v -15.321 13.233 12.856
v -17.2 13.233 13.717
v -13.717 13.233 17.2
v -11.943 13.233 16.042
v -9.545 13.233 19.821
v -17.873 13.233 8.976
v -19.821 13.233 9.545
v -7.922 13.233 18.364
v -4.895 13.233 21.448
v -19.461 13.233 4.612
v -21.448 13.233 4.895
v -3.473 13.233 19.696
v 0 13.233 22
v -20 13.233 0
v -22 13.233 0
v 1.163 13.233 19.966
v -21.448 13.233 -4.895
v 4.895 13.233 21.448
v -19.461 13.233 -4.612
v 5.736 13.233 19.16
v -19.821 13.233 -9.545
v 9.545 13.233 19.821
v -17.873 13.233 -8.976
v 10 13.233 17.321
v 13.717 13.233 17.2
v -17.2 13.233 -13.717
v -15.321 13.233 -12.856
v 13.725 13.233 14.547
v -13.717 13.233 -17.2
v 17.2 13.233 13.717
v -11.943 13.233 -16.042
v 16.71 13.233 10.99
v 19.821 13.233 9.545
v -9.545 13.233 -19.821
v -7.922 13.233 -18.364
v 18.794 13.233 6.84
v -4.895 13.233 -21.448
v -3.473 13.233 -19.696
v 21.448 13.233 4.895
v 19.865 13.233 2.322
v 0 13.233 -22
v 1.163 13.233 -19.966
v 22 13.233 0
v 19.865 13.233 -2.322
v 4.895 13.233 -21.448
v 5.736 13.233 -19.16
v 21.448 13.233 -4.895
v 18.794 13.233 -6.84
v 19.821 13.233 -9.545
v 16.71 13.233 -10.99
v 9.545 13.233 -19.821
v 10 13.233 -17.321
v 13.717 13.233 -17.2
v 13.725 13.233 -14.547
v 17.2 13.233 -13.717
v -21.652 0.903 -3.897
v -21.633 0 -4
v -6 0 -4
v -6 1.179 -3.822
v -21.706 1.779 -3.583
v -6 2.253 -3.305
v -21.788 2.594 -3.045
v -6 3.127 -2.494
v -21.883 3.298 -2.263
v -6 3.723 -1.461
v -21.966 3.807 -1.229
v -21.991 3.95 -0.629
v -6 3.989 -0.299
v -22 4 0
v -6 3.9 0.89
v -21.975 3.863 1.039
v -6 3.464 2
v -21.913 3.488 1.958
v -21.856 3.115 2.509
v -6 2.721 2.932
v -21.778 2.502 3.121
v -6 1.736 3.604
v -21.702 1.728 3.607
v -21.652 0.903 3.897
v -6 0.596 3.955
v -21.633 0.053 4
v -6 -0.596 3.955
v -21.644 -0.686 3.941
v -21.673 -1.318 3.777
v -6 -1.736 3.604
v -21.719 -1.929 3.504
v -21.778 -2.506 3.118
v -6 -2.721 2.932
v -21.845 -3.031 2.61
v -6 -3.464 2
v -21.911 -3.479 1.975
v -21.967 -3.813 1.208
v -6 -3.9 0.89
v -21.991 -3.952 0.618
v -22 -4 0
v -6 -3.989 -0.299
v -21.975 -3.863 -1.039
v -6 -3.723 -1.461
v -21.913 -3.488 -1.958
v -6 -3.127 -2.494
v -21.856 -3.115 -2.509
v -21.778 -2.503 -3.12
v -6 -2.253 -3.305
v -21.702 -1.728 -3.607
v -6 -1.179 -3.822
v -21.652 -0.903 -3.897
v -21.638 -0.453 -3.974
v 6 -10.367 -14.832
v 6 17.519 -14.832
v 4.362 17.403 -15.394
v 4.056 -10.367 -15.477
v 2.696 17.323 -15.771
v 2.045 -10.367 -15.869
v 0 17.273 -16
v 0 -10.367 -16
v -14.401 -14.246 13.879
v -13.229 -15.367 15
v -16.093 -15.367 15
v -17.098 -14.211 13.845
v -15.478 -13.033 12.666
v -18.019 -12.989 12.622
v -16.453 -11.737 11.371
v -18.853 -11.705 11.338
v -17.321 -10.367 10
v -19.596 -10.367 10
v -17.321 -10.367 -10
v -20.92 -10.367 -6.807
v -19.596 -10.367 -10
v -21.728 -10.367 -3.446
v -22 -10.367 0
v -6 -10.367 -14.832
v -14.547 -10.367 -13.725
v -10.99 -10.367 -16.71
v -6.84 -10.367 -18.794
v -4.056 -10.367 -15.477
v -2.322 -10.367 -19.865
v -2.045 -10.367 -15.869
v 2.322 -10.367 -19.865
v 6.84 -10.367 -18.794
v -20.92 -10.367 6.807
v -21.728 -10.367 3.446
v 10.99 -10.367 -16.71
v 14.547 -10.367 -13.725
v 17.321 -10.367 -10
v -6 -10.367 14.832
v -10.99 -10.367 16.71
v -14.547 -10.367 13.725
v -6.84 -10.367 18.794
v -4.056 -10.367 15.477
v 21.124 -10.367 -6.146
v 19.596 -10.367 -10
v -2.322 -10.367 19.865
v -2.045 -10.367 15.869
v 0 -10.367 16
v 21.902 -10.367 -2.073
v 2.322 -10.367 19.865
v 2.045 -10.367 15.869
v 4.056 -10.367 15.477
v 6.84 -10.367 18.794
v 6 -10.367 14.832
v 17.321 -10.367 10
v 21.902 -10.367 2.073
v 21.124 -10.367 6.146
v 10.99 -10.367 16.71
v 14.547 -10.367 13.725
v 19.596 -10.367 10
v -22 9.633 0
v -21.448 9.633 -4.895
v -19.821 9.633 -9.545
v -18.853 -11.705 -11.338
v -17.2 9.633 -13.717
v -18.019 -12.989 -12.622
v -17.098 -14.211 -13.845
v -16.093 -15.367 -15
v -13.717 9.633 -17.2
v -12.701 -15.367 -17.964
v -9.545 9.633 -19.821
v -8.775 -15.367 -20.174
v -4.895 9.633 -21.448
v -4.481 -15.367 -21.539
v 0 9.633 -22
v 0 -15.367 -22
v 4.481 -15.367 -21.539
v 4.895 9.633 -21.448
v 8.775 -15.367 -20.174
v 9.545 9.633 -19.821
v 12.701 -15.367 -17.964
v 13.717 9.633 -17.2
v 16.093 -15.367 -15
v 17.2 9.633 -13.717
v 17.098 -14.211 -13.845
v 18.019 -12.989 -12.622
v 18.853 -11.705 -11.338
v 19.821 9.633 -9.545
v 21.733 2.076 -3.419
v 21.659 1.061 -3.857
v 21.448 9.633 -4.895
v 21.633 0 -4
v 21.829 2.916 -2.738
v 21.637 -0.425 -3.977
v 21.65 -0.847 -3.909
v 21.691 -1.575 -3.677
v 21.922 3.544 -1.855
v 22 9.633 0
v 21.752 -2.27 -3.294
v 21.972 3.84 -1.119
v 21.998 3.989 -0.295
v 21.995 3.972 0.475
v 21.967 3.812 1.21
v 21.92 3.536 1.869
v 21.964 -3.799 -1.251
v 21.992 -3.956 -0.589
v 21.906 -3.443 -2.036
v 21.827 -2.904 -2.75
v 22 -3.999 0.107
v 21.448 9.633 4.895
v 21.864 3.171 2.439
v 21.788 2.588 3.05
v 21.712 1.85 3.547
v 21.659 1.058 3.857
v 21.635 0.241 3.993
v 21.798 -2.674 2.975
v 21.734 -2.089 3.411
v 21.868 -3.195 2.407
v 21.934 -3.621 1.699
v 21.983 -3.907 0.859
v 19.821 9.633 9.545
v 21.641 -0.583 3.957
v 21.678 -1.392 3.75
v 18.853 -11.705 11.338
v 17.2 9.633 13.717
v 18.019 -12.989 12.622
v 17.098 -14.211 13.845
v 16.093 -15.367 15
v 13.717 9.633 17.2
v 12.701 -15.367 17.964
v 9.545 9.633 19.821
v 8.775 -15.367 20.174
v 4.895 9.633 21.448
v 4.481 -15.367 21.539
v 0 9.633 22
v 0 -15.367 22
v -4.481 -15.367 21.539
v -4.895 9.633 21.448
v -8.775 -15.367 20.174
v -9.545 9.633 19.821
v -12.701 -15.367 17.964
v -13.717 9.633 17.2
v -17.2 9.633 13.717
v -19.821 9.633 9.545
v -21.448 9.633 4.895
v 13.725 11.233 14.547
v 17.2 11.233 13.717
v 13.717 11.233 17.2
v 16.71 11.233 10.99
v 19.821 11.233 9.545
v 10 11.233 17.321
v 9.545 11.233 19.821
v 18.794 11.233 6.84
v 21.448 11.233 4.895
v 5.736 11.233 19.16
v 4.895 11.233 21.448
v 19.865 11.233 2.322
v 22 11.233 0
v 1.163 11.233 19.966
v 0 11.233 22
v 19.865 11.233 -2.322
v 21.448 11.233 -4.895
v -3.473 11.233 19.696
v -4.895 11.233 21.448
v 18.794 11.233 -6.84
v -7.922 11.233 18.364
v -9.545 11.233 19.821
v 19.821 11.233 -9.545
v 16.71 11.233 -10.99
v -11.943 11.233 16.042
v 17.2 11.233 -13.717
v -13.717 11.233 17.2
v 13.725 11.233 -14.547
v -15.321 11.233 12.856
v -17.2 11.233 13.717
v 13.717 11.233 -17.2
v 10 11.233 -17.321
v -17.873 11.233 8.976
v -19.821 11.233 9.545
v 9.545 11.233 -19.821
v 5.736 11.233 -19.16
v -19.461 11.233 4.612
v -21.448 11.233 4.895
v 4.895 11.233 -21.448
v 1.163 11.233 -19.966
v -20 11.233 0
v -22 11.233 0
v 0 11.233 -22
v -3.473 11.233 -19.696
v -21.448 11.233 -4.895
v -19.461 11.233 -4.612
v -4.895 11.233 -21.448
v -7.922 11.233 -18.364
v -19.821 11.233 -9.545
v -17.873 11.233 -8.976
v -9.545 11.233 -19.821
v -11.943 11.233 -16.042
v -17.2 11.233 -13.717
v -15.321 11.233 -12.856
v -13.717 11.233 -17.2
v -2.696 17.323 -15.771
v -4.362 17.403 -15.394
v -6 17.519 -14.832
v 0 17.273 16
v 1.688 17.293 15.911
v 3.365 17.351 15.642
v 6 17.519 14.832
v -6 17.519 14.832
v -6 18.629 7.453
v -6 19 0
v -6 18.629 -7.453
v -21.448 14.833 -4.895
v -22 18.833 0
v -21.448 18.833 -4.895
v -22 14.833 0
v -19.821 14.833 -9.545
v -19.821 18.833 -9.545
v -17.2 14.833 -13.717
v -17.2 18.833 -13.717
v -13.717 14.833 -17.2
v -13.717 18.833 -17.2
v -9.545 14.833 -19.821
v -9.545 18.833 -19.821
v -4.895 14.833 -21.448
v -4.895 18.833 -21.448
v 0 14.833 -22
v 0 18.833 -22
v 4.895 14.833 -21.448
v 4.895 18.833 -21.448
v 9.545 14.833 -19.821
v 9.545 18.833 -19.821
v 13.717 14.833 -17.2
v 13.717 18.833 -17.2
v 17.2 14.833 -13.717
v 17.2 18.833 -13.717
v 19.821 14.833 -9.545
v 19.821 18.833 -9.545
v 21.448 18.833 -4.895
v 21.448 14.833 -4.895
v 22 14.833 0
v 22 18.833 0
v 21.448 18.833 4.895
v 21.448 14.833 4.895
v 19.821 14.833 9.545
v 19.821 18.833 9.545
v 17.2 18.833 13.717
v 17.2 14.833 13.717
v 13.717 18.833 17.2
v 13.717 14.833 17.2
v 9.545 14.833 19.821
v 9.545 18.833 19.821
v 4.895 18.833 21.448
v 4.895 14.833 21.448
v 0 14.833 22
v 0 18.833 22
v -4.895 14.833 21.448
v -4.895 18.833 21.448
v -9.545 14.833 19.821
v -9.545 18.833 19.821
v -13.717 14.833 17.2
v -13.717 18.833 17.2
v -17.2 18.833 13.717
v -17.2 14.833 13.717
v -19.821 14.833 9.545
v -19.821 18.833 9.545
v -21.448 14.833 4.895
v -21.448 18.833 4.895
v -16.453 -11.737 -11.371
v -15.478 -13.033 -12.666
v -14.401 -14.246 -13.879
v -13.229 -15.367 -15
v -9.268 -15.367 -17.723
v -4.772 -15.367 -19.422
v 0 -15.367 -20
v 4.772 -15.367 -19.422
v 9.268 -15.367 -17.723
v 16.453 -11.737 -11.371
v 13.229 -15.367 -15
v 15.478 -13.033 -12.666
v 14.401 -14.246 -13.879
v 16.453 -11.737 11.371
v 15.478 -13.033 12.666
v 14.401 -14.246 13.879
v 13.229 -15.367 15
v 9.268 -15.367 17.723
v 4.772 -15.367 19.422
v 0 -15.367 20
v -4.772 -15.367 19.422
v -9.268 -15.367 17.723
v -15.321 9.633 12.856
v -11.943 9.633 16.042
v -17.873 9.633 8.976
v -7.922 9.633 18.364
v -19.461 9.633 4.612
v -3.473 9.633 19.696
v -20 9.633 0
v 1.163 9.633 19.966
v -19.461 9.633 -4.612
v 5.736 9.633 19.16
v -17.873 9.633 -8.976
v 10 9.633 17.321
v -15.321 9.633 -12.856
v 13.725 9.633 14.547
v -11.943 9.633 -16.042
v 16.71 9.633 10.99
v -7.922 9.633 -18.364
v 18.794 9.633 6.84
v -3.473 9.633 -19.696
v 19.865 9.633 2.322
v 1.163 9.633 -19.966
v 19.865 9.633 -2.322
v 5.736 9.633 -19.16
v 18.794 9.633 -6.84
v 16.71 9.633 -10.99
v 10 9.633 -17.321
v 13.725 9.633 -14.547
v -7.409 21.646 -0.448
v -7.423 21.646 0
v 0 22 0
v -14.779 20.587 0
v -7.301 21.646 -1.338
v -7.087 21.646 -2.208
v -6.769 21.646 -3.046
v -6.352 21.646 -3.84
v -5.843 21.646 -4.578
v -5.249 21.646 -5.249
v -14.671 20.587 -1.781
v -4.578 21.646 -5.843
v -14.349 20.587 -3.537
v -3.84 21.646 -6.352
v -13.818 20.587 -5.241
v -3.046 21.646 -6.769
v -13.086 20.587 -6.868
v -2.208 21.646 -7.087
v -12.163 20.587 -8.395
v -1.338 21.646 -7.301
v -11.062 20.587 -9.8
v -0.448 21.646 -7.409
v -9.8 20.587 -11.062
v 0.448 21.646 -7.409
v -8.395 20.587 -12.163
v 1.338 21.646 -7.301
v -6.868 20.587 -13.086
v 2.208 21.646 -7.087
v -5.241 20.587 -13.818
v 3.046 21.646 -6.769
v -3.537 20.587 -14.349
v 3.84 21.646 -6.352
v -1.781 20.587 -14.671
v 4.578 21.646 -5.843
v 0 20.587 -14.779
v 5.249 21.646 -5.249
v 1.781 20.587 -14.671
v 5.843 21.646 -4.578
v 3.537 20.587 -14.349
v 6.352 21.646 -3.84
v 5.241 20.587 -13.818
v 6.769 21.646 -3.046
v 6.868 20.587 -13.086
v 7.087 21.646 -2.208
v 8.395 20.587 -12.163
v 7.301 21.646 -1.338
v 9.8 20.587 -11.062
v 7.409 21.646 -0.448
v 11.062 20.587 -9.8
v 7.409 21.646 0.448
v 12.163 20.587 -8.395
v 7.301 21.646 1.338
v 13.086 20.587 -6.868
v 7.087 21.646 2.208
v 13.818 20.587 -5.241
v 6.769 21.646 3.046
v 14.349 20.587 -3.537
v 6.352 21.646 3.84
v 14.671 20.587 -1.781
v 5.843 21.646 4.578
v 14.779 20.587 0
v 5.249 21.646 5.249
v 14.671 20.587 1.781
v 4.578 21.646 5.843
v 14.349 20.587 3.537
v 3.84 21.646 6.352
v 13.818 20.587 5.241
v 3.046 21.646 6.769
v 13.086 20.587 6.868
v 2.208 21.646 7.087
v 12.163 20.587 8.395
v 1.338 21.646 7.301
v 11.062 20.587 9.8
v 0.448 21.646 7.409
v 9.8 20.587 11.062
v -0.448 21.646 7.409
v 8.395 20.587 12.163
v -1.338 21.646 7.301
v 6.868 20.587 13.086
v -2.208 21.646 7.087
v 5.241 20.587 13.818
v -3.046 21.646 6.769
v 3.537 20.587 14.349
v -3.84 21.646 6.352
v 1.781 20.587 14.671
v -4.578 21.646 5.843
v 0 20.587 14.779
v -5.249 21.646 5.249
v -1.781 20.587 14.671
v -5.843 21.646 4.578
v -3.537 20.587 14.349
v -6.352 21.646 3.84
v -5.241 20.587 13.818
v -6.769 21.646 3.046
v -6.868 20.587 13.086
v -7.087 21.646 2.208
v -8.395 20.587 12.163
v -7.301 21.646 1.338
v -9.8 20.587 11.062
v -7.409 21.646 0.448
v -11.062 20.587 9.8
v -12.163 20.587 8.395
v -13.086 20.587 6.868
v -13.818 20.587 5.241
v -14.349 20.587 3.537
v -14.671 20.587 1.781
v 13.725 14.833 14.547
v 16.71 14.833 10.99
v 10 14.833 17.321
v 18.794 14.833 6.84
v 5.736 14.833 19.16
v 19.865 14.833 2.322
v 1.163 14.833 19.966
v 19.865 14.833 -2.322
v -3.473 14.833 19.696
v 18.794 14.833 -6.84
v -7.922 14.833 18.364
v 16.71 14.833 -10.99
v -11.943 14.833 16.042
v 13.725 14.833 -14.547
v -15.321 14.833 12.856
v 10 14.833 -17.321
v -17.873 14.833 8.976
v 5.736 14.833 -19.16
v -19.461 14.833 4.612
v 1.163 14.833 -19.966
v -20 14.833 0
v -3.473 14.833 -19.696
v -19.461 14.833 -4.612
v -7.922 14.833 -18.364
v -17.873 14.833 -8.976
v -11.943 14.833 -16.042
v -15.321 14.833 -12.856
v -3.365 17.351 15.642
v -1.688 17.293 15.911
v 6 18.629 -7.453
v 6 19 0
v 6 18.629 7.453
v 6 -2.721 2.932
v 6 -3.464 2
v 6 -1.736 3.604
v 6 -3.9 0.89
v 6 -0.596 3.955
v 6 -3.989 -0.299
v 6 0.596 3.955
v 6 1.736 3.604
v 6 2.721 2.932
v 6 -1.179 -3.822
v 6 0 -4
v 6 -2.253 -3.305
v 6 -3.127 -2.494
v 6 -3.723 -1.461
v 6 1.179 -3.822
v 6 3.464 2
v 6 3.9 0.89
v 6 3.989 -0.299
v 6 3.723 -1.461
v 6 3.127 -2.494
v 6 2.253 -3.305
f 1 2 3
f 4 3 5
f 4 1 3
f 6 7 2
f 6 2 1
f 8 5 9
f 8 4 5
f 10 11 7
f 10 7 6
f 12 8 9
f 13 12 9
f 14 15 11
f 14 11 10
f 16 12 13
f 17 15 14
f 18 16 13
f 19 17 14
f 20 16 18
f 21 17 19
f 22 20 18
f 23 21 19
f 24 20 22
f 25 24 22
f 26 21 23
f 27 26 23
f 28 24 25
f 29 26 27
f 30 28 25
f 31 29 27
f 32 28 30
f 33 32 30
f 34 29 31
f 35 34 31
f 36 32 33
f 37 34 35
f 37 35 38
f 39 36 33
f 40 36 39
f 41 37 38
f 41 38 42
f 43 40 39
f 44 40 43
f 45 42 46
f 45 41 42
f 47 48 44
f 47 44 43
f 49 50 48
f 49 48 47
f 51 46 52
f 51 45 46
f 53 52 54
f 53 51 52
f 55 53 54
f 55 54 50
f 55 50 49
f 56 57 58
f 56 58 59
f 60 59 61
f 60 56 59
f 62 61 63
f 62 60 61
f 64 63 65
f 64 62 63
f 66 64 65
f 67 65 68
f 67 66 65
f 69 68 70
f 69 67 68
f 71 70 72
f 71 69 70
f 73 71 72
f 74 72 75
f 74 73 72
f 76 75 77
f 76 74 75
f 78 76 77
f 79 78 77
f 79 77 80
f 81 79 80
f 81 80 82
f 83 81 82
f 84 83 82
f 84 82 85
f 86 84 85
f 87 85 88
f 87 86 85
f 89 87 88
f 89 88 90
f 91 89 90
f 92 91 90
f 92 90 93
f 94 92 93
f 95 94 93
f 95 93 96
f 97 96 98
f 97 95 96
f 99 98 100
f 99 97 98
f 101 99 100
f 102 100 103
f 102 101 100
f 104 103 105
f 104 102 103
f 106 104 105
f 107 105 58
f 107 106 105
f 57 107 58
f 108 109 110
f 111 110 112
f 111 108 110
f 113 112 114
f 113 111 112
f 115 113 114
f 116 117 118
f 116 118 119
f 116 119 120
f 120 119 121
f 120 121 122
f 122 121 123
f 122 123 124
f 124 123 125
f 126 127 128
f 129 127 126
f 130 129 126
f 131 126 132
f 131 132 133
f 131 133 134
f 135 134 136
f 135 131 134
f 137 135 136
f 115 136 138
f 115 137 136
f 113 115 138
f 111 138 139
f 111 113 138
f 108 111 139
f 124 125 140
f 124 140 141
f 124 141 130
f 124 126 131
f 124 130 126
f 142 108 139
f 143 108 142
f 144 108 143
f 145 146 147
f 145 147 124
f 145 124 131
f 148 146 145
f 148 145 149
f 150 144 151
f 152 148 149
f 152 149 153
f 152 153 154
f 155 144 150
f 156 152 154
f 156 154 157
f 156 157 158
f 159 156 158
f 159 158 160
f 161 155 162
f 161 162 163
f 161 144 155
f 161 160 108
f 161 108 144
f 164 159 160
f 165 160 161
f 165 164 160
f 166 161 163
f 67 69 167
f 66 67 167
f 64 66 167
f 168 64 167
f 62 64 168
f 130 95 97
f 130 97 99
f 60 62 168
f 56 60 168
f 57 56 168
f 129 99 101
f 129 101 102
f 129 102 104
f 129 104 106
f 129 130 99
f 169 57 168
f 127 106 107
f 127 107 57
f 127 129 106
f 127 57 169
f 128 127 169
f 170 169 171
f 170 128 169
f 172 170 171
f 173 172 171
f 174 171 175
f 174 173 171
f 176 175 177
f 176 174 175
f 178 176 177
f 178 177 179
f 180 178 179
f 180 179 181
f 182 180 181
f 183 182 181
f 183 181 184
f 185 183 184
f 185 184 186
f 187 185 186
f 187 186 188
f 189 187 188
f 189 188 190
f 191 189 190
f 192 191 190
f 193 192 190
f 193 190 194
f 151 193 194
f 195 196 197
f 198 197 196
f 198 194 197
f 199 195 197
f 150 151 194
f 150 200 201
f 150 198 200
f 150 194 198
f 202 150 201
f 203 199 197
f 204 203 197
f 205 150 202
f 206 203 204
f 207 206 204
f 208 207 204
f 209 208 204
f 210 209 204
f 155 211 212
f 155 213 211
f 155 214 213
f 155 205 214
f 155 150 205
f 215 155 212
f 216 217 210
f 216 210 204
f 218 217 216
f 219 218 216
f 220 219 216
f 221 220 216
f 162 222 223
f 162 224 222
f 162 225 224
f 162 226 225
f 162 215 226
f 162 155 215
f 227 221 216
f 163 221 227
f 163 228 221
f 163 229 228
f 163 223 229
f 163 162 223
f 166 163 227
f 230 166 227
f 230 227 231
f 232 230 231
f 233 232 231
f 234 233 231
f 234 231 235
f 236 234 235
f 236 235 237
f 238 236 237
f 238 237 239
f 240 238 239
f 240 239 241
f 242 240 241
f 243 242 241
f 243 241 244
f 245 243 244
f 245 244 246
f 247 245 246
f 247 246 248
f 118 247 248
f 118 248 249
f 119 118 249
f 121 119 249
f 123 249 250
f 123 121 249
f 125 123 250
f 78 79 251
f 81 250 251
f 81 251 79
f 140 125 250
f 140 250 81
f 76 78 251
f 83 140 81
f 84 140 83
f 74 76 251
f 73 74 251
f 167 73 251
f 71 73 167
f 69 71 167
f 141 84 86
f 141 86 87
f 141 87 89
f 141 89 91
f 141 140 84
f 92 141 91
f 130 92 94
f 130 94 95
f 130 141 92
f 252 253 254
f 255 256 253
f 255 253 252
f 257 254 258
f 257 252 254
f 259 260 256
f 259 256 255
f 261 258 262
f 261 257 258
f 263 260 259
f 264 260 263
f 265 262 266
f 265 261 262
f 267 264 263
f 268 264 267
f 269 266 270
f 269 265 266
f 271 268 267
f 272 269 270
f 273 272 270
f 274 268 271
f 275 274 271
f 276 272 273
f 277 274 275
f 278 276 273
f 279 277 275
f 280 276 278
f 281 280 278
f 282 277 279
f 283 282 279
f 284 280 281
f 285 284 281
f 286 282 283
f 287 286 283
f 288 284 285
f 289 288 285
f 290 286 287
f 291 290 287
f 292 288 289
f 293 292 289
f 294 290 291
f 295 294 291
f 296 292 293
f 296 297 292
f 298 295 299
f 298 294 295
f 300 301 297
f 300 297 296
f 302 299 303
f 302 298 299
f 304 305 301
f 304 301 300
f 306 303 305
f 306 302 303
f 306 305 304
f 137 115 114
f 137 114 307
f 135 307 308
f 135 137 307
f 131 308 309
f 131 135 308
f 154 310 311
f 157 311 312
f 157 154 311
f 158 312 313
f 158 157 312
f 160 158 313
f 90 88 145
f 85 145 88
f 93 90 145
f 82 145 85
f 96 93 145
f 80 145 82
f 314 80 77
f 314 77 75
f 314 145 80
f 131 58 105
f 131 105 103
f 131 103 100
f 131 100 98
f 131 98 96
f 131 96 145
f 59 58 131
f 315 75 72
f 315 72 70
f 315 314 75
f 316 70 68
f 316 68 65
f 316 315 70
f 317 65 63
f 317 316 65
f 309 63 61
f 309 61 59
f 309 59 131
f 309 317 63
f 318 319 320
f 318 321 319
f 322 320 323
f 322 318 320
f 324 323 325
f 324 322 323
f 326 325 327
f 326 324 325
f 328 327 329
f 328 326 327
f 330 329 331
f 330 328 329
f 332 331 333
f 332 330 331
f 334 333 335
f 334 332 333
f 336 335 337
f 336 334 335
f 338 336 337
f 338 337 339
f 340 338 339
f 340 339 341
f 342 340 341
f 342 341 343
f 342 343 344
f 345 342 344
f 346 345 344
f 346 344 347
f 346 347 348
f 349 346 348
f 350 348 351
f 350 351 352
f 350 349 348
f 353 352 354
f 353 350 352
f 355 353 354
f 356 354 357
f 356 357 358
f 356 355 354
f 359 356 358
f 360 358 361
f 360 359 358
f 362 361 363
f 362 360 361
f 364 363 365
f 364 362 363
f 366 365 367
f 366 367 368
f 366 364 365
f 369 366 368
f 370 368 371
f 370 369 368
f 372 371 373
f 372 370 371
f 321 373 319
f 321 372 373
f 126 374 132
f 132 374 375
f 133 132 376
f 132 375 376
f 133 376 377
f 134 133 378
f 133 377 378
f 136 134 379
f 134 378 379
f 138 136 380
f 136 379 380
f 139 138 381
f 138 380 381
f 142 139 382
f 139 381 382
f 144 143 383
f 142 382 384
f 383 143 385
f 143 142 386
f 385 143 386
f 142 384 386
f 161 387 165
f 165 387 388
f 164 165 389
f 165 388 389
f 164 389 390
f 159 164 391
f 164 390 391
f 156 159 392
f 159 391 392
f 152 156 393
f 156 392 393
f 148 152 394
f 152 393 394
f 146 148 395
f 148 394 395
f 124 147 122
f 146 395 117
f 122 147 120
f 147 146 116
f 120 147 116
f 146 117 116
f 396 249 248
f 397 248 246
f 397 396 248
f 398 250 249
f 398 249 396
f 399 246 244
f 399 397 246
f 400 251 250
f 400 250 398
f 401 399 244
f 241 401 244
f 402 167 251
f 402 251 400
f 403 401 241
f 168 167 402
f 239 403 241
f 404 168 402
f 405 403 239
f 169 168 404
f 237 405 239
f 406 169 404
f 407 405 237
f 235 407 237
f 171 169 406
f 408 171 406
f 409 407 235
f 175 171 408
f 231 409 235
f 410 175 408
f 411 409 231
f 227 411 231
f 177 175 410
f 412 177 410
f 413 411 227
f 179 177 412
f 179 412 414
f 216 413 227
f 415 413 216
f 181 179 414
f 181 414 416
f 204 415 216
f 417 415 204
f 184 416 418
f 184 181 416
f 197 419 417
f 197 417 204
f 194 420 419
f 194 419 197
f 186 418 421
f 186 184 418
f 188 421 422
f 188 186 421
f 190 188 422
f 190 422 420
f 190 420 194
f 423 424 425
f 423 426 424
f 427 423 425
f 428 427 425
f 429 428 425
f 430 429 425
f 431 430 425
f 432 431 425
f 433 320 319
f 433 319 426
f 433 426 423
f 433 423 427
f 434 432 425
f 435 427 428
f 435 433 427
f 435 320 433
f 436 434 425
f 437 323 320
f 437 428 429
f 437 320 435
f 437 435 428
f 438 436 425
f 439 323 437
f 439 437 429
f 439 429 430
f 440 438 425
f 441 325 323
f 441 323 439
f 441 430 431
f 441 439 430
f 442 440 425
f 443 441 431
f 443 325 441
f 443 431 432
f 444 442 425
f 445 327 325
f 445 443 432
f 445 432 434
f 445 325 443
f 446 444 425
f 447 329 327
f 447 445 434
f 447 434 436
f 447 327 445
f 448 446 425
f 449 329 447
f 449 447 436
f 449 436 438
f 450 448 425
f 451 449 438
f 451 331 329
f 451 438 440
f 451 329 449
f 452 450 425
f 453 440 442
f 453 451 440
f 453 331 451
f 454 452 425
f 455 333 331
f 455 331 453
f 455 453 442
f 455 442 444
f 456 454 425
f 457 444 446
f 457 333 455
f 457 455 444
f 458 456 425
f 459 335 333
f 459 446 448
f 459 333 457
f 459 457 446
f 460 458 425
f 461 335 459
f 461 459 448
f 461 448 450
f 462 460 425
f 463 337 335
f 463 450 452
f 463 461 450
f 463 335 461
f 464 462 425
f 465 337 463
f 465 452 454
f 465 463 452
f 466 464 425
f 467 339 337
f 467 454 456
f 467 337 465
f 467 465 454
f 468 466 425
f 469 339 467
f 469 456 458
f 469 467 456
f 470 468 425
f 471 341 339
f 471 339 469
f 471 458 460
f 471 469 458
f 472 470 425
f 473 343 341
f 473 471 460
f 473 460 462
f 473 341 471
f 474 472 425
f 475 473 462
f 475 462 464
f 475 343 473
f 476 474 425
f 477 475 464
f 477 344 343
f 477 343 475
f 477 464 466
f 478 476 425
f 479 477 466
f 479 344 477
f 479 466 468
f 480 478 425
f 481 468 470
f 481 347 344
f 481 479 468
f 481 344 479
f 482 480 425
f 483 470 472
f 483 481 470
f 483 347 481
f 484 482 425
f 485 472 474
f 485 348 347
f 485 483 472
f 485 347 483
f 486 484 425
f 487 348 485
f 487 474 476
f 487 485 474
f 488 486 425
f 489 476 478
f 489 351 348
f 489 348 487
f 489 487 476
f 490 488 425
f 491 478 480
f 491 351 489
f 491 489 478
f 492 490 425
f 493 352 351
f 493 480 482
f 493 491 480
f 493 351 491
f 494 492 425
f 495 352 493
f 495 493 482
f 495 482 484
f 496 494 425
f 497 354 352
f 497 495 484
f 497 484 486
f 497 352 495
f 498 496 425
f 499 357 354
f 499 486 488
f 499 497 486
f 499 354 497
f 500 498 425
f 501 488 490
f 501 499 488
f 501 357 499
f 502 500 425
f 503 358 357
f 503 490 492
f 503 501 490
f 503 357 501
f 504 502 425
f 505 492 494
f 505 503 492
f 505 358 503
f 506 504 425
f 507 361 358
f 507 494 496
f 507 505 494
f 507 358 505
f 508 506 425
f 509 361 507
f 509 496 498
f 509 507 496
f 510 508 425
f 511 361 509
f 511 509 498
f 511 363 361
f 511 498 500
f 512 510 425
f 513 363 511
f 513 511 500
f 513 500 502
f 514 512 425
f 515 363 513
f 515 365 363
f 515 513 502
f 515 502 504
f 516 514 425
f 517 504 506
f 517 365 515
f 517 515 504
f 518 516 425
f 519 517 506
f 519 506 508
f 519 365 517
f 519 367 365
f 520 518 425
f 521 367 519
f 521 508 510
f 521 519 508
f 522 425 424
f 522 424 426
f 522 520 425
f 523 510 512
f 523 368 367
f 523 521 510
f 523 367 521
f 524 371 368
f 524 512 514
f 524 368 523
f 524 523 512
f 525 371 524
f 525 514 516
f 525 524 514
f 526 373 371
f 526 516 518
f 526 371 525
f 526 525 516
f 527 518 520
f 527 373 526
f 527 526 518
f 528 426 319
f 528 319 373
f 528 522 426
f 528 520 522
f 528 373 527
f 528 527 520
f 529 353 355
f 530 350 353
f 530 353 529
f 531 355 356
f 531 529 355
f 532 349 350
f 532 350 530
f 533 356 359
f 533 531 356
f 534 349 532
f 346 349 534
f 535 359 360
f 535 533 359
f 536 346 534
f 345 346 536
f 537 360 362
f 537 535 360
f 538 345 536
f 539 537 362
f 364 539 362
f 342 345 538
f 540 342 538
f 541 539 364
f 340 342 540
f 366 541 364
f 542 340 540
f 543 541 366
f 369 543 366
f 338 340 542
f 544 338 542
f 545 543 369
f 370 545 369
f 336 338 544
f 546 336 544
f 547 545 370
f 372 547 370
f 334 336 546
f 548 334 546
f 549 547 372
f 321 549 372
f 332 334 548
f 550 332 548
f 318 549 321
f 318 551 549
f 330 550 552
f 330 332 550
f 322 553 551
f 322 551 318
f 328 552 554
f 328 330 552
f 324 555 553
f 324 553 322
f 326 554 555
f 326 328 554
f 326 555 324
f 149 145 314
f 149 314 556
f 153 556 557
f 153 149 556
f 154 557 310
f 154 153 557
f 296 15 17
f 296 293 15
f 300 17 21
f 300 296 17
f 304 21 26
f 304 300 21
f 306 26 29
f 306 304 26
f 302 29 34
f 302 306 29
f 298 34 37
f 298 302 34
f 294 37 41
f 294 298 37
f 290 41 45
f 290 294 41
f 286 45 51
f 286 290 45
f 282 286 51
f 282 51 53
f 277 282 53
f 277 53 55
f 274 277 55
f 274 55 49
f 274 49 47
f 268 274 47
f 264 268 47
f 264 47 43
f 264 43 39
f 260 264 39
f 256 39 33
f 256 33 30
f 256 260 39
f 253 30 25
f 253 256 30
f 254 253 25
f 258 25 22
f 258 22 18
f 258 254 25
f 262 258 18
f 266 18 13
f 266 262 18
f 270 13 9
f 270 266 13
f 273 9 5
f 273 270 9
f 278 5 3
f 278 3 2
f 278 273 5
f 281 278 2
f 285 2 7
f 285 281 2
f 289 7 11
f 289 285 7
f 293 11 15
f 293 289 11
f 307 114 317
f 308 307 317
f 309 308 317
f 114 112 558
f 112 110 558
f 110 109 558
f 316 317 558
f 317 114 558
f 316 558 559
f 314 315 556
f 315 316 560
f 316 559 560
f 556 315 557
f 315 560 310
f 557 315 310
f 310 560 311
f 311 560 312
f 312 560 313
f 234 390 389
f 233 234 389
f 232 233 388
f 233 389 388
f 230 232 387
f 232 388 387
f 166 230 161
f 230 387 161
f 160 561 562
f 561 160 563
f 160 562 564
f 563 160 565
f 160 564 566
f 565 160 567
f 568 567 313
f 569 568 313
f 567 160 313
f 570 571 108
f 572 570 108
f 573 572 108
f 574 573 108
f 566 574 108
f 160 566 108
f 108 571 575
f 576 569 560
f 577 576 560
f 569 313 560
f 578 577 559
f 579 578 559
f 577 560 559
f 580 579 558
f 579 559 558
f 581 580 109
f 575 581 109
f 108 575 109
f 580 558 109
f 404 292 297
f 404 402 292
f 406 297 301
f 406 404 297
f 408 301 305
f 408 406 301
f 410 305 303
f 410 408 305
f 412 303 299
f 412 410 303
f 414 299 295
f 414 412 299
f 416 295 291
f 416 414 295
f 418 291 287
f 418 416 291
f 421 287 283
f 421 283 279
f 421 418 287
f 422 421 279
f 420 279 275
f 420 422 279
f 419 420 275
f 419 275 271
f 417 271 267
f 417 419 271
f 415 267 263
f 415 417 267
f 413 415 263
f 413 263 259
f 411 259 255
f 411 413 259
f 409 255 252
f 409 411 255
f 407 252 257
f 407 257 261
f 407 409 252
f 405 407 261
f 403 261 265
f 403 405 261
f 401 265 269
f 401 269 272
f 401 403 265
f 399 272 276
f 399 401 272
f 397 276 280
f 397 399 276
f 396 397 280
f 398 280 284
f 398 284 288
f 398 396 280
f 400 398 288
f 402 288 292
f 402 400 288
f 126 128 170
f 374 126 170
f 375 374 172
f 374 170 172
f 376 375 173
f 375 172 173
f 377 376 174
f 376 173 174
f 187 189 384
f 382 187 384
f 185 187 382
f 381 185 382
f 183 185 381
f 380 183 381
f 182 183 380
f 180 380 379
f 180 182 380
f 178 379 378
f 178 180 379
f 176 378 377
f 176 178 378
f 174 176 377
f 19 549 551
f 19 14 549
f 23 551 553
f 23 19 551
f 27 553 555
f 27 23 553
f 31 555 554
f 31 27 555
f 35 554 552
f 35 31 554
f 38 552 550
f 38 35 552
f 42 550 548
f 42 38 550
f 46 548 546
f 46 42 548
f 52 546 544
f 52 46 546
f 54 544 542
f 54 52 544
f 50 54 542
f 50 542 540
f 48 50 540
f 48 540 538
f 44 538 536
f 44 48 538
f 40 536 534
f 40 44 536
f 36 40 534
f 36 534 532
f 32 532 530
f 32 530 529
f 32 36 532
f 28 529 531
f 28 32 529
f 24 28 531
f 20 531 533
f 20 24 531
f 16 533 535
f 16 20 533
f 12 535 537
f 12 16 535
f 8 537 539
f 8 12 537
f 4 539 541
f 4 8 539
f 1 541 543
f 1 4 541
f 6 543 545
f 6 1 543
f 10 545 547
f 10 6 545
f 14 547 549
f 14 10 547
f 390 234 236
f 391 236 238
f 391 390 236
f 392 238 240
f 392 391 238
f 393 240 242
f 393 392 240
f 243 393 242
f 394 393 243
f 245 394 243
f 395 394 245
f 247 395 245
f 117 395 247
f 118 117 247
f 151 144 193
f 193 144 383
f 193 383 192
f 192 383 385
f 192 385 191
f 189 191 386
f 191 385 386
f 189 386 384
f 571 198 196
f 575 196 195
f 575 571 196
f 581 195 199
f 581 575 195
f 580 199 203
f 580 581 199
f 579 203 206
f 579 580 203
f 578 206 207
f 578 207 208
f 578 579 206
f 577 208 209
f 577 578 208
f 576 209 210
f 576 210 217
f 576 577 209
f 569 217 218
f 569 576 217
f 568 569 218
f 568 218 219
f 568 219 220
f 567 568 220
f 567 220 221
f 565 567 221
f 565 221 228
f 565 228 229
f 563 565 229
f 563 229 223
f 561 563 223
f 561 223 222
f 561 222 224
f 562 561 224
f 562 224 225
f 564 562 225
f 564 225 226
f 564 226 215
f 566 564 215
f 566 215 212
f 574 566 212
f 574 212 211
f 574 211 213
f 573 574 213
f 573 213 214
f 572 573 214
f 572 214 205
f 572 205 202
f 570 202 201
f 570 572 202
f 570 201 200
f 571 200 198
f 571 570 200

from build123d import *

# Parameters (mm, degrees)
CUT_EXTRUDE_2_DEPTH      = 39.105117767
CUT_EXTRUDE_2_DEPTH_BACK = 39.105117767
SKETCH_4_R               = 4
SKETCH_6_R               = 20
CUT_EXTRUDE_3_DEPTH      = 5
CUT_EXTRUDE_4_DEPTH      = 6
EXTRUDE_1_REACH          = 46.896
EXTRUDE_1_END_RADIUS     = 75


with BuildPart() as part:
    # 草图1 → 旋转3 (revolve)
    with BuildSketch(Plane.XY):
        with BuildLine():
            Line((-22, 9.633147735), (-22, -15.366852265))
            Line((-22, -15.366852265), (0, -15.366852265))
            Line((0, -15.366852265), (0, 22))
            ThreePointArc((0, 22), (-11.113381048, 21.204227615), (-22, 18.833147735))
            Line((-22, 18.833147735), (-22, 14.833147735))
            Line((-22, 14.833147735), (-20, 14.833147735))
            Line((-20, 14.833147735), (-20, 13.233147735))
            Line((-20, 13.233147735), (-22, 13.233147735))
            Line((-22, 13.233147735), (-22, 11.233147735))
            Line((-22, 11.233147735), (-20, 11.233147735))
            Line((-20, 11.233147735), (-20, 9.633147735))
            Line((-20, 9.633147735), (-22, 9.633147735))
        make_face()
    revolve(axis=Axis((0, 22, 0), (0, -1, 0)))

    # 草图4 → 切除-拉伸2 (cut, two sides: drawn at the far end of the back side and taken through both)
    with BuildSketch(Plane(origin=(0, 0, 0), x_dir=(0, 0, -1), z_dir=(1, 0, 0)).offset(-CUT_EXTRUDE_2_DEPTH_BACK)):
        Circle(SKETCH_4_R)
        Polygon((-15, -15.366852265), (-10, -10.366852265), (10, -10.366852265), (15, -15.366852265), align=None)
    extrude(amount=CUT_EXTRUDE_2_DEPTH + CUT_EXTRUDE_2_DEPTH_BACK, mode=Mode.SUBTRACT)

    # 草图6 → 切除-拉伸3 (cut)
    with BuildSketch(Plane.XZ.offset(15.366852265)):
        with Locations(Location((0, 0, 0), (0, 0, 180))):
            Circle(SKETCH_6_R)
    extrude(amount=-CUT_EXTRUDE_3_DEPTH, mode=Mode.SUBTRACT)

    # 草图8 → 切除-拉伸4 (cut, symmetric)
    with BuildSketch(Plane(origin=(0, 0, 0), x_dir=(0, 0, -1), z_dir=(1, 0, 0))):
        with BuildLine():
            Line((-16, 17.273460407), (-16, -10.366852265))
            Line((-16, -10.366852265), (16, -10.366852265))
            Line((16, -10.366852265), (16, 17.273460407))
            ThreePointArc((16, 17.273460407), (0, 19), (-16, 17.273460407))
        make_face()
    extrude(amount=CUT_EXTRUDE_4_DEPTH, both=True, mode=Mode.SUBTRACT)

    # 凸台-拉伸1: up to this cylinder (the profile starts inside it)
    extrude_1_end = Plane(origin=(0, -56, 0), z_dir=(1, 0, 0)) * Cylinder(EXTRUDE_1_END_RADIUS, 253.81433, mode=Mode.PRIVATE)
    # 草图9 → 凸台-拉伸1 (add, up to the surface)
    with BuildSketch(Plane.XZ.offset(10.366852265), mode=Mode.PRIVATE) as extrude_1_sk1:
        with BuildLine():
            Line((6, -16), (6, -14.832396974))
            ThreePointArc((6, -14.832396974), (3.056276215, -15.705386837), (3.1e-08, -16))
            Line((3.1e-08, -16), (6, -16))
        make_face()
    extrude_1_tool1 = extrude(extrude_1_sk1.sketch, amount=-EXTRUDE_1_REACH, mode=Mode.PRIVATE) & extrude_1_end
    add(extrude_1_tool1.solids().sort_by_distance((4.511165, -10.366852, -15.652025))[0])
    # 草图9 → 凸台-拉伸1 (add, up to the surface)
    with BuildSketch(Plane.XZ.offset(10.366852265), mode=Mode.PRIVATE) as extrude_1_sk2:
        with BuildLine():
            Line((-6, -16), (3.1e-08, -16))
            ThreePointArc((3.1e-08, -16), (-3.056276184, -15.705386843), (-6, -14.832396974))
            Line((-6, -14.832396974), (-6, -16))
        make_face()
    extrude_1_tool2 = extrude(extrude_1_sk2.sketch, amount=-EXTRUDE_1_REACH, mode=Mode.PRIVATE) & extrude_1_end
    add(extrude_1_tool2.solids().sort_by_distance((-4.511165, -10.366852, -15.652025))[0])
    # 草图9 → 凸台-拉伸1 (add, up to the surface)
    with BuildSketch(Plane.XZ.offset(10.366852265), mode=Mode.PRIVATE) as extrude_1_sk3:
        with BuildLine():
            ThreePointArc((-6, 14.832396974), (-3.056276199, 15.70538684), (0, 16))
            Line((0, 16), (-6, 16))
            Line((-6, 16), (-6, 14.832396974))
        make_face()
    extrude_1_tool3 = extrude(extrude_1_sk3.sketch, amount=-EXTRUDE_1_REACH, mode=Mode.PRIVATE) & extrude_1_end
    add(extrude_1_tool3.solids().sort_by_distance((-4.511165, -10.366852, 15.652025))[0])
    # 草图9 → 凸台-拉伸1 (add, up to the surface)
    with BuildSketch(Plane.XZ.offset(10.366852265), mode=Mode.PRIVATE) as extrude_1_sk4:
        with BuildLine():
            Line((6, 14.832396974), (6, 16))
            Line((6, 16), (0, 16))
            ThreePointArc((0, 16), (3.056276199, 15.70538684), (6, 14.832396974))
        make_face()
    extrude_1_tool4 = extrude(extrude_1_sk4.sketch, amount=-EXTRUDE_1_REACH, mode=Mode.PRIVATE) & extrude_1_end
    add(extrude_1_tool4.solids().sort_by_distance((4.511165, -10.366852, 15.652025))[0])


solid = part.part
